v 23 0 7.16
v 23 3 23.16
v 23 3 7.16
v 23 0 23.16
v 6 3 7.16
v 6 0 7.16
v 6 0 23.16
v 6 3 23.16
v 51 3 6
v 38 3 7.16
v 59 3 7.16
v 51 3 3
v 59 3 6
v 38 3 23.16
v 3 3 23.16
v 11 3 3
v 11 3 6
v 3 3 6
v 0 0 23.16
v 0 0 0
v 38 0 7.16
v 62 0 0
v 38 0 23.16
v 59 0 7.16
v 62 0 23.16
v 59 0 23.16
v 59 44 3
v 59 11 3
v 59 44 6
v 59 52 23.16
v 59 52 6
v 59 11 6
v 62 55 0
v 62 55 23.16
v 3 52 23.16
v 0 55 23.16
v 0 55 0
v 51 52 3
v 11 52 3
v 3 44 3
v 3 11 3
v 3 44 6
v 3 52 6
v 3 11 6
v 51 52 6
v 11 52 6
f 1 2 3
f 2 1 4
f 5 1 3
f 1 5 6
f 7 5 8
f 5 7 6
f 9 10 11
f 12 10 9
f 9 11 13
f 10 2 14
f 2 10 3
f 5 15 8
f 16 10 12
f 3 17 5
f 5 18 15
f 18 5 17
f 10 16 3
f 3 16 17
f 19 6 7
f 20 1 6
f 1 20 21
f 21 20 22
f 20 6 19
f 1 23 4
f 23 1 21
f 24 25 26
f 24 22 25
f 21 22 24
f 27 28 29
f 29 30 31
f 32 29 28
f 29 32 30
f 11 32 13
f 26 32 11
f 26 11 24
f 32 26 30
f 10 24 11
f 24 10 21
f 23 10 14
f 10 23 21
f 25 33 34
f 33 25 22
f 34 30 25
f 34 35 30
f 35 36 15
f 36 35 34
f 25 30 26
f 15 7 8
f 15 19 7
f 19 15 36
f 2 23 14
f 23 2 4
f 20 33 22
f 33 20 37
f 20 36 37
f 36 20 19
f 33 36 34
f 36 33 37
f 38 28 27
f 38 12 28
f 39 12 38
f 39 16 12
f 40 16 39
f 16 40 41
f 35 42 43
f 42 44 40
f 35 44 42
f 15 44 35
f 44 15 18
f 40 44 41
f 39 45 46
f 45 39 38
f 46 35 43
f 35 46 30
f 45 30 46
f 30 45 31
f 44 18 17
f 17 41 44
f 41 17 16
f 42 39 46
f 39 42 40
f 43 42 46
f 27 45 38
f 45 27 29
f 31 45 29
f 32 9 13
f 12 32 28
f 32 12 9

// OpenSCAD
w = 56;
h = 49;
thickness = 3;
bottom_space = 3;
board_thickness = 1.16;
board_corner = 8;
components_thickness = 16;

box();

module box() {
    union() {
        difference() {
            cube([w + thickness * 2, h + thickness * 2, thickness + bottom_space + board_thickness + components_thickness]);

            translate([thickness, thickness, thickness])
                cube([w, h, bottom_space]);

            translate([thickness, thickness, thickness + bottom_space])
                cube([w, h, board_thickness + components_thickness]);
            front_holes();
        }
        translate([thickness, thickness, thickness]) {
            sw_corner();
            translate([0, h, 0])
                nw_corner();
            translate([w, h, 0])
                ne_corner();
            translate([w, 0, 0])
                se_corner();
        }
    }
}

module front_holes() {
    wall_left_w = 3;
    f_w = 17;

    translate([thickness + wall_left_w, 0, thickness + bottom_space + board_thickness]) {
        cube([f_w, thickness, components_thickness]);
        translate([f_w + 15, 0, 0])
            cube([w - f_w - 15 - wall_left_w, thickness, components_thickness]);
    }
    
    wall_right_w = 1;
}



module nw_corner() {
    rotate([0, 0, 270])
        sw_corner();
}

module ne_corner() {
    rotate([0, 0, 180])
        sw_corner();
}

module se_corner() {
    rotate([0, 0, 90])
        sw_corner();
}

module sw_corner() {
    linear_extrude(height = bottom_space)
        polygon(points=[
            [0, 0],
            [0, board_corner],
            [board_corner, 0]
        ]);
}
